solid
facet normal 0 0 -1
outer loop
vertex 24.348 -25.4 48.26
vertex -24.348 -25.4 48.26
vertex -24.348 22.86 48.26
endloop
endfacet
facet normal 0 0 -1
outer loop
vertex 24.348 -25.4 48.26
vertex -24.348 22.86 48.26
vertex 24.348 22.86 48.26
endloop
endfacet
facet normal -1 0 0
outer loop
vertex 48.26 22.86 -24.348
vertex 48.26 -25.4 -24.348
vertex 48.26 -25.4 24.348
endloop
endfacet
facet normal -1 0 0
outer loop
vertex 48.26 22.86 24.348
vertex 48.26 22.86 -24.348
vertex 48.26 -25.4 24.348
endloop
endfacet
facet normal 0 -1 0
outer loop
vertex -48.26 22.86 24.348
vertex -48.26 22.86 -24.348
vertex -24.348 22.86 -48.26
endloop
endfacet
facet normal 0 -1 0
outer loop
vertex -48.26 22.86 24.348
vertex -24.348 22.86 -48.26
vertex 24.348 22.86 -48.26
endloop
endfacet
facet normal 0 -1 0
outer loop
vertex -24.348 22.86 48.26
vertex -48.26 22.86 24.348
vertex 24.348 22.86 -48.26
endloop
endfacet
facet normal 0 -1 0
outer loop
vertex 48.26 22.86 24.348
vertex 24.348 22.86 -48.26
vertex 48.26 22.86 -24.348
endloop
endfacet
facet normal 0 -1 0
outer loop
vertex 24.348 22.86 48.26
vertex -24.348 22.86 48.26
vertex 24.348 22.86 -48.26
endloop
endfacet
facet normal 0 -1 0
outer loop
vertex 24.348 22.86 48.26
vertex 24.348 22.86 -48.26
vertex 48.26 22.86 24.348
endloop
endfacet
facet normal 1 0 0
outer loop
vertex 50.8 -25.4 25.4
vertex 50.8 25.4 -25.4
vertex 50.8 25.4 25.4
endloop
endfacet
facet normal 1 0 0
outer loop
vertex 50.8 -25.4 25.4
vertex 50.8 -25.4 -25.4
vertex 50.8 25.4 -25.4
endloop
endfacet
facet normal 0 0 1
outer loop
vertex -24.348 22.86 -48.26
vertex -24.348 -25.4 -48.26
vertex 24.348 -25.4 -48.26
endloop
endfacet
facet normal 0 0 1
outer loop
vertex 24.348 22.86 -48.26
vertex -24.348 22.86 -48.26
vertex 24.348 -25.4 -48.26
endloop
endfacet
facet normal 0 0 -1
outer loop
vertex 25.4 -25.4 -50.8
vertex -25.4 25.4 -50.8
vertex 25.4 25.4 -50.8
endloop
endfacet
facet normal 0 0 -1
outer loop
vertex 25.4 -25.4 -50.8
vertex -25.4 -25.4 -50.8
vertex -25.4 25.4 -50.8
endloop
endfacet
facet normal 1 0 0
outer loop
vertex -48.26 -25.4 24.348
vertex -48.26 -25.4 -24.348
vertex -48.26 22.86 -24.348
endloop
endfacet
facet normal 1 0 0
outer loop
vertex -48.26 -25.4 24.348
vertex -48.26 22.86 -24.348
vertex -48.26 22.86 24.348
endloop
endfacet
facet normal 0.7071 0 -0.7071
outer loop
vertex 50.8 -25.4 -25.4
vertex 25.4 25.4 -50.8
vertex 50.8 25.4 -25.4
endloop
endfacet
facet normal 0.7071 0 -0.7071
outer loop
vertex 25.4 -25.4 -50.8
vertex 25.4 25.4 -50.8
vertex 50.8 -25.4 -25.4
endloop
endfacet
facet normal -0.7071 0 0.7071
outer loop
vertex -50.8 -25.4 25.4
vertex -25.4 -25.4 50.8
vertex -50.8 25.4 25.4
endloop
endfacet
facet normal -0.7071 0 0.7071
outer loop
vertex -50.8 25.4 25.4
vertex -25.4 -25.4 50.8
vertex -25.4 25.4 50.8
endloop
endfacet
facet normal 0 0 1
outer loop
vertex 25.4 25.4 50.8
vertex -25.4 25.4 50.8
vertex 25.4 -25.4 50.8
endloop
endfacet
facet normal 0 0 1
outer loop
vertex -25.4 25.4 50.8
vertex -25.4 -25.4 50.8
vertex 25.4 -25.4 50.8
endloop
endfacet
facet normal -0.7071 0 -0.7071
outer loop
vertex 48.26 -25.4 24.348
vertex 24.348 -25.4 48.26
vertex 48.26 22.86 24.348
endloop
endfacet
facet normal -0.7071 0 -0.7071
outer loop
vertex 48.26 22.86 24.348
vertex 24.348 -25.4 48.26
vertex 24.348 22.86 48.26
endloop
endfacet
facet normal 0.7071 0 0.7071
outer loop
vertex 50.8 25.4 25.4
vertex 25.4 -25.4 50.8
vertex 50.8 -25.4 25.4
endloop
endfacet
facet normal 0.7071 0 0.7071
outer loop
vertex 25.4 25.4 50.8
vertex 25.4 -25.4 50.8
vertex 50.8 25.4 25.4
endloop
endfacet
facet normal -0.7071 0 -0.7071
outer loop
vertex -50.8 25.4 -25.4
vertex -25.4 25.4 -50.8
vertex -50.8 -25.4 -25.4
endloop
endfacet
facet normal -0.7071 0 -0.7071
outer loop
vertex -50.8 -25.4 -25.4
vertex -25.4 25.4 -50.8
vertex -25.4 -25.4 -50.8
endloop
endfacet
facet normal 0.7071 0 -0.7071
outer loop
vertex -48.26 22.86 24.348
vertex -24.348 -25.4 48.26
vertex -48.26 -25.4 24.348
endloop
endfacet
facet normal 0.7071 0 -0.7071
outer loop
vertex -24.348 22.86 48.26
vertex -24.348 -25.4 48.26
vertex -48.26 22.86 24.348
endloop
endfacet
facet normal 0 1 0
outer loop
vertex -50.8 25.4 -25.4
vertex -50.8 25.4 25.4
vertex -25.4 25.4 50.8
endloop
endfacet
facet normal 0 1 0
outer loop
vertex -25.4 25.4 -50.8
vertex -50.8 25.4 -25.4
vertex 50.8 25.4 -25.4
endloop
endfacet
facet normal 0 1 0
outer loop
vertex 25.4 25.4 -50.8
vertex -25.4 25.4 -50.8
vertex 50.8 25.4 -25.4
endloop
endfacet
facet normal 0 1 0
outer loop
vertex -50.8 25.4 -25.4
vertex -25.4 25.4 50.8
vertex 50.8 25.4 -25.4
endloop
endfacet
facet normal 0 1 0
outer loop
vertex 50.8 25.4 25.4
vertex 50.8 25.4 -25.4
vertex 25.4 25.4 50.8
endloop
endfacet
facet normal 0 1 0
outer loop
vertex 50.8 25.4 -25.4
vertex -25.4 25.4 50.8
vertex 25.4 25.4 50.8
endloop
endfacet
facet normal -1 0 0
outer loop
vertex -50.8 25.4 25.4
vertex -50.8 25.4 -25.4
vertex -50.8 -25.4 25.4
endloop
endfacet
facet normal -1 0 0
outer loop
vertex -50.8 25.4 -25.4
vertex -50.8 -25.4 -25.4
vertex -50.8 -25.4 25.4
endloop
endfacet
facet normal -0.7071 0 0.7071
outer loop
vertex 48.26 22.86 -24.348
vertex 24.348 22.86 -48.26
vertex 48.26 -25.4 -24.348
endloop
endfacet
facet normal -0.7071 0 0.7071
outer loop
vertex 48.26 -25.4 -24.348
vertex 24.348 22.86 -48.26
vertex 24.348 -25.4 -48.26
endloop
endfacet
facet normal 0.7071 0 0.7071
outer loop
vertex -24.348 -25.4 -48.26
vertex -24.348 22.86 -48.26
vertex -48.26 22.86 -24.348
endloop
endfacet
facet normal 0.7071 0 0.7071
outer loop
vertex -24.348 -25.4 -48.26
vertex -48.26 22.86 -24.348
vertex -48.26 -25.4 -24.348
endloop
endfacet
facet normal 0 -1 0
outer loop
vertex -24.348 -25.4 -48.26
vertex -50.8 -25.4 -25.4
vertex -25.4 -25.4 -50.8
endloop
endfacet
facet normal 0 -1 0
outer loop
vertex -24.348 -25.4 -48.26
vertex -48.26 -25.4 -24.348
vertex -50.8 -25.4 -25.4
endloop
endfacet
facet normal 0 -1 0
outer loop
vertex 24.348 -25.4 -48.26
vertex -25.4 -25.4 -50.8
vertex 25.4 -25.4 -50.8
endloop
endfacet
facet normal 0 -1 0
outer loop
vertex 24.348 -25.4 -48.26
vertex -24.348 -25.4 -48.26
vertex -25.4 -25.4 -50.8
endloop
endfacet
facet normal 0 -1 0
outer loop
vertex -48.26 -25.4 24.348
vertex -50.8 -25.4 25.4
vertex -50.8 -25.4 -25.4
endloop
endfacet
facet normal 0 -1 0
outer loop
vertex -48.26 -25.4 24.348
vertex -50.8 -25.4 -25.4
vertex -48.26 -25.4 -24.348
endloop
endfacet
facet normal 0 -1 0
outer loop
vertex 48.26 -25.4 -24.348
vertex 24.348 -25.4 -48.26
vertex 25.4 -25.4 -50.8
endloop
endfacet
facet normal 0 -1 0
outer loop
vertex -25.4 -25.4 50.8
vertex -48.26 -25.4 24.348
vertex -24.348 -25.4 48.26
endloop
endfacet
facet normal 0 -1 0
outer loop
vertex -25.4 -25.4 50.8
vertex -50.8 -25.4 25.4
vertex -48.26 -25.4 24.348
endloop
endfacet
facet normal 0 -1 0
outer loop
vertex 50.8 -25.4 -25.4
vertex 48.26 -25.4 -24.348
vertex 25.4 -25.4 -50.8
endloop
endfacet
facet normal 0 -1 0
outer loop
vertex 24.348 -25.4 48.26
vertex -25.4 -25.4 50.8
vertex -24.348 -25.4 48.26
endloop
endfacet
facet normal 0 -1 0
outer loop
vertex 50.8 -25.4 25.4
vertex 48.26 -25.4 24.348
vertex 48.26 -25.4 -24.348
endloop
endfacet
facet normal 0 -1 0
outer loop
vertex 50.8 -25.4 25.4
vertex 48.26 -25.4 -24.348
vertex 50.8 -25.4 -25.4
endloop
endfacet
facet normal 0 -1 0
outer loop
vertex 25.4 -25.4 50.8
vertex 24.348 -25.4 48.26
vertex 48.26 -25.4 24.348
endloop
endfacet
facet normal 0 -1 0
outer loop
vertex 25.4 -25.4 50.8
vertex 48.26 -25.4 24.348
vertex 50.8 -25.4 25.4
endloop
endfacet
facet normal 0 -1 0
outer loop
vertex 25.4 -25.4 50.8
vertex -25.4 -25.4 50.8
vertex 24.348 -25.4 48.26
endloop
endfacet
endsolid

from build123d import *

# Parameters (mm, degrees)
F0_W     = 101.6
F0_H     = 101.6
F1_DEPTH = 25.4
F2_SIZE  = 25.4
F3_T     = -2.54


with BuildPart() as f1:
    # F0 (on Front) → F1 (new body, symmetric)
    with BuildSketch(Plane.XZ):
        Rectangle(F0_W, F0_H)
    extrude(amount=F1_DEPTH, both=True)

    # F2
    f2_edges = [f1.edges().sort_by_distance(p)[0] for p in [
        (-50.8, 0, 50.8),
        (50.8, 0, 50.8),
        (-50.8, 0, -50.8),
        (50.8, 0, -50.8),
    ]]
    chamfer(f2_edges, length=F2_SIZE)

    # F3
    f3_openings = [f1.faces().sort_by_distance(p)[0] for p in [
        (0, -25.4, 0),
    ]]
    offset(amount=F3_T, openings=f3_openings)


solid = f1.part
